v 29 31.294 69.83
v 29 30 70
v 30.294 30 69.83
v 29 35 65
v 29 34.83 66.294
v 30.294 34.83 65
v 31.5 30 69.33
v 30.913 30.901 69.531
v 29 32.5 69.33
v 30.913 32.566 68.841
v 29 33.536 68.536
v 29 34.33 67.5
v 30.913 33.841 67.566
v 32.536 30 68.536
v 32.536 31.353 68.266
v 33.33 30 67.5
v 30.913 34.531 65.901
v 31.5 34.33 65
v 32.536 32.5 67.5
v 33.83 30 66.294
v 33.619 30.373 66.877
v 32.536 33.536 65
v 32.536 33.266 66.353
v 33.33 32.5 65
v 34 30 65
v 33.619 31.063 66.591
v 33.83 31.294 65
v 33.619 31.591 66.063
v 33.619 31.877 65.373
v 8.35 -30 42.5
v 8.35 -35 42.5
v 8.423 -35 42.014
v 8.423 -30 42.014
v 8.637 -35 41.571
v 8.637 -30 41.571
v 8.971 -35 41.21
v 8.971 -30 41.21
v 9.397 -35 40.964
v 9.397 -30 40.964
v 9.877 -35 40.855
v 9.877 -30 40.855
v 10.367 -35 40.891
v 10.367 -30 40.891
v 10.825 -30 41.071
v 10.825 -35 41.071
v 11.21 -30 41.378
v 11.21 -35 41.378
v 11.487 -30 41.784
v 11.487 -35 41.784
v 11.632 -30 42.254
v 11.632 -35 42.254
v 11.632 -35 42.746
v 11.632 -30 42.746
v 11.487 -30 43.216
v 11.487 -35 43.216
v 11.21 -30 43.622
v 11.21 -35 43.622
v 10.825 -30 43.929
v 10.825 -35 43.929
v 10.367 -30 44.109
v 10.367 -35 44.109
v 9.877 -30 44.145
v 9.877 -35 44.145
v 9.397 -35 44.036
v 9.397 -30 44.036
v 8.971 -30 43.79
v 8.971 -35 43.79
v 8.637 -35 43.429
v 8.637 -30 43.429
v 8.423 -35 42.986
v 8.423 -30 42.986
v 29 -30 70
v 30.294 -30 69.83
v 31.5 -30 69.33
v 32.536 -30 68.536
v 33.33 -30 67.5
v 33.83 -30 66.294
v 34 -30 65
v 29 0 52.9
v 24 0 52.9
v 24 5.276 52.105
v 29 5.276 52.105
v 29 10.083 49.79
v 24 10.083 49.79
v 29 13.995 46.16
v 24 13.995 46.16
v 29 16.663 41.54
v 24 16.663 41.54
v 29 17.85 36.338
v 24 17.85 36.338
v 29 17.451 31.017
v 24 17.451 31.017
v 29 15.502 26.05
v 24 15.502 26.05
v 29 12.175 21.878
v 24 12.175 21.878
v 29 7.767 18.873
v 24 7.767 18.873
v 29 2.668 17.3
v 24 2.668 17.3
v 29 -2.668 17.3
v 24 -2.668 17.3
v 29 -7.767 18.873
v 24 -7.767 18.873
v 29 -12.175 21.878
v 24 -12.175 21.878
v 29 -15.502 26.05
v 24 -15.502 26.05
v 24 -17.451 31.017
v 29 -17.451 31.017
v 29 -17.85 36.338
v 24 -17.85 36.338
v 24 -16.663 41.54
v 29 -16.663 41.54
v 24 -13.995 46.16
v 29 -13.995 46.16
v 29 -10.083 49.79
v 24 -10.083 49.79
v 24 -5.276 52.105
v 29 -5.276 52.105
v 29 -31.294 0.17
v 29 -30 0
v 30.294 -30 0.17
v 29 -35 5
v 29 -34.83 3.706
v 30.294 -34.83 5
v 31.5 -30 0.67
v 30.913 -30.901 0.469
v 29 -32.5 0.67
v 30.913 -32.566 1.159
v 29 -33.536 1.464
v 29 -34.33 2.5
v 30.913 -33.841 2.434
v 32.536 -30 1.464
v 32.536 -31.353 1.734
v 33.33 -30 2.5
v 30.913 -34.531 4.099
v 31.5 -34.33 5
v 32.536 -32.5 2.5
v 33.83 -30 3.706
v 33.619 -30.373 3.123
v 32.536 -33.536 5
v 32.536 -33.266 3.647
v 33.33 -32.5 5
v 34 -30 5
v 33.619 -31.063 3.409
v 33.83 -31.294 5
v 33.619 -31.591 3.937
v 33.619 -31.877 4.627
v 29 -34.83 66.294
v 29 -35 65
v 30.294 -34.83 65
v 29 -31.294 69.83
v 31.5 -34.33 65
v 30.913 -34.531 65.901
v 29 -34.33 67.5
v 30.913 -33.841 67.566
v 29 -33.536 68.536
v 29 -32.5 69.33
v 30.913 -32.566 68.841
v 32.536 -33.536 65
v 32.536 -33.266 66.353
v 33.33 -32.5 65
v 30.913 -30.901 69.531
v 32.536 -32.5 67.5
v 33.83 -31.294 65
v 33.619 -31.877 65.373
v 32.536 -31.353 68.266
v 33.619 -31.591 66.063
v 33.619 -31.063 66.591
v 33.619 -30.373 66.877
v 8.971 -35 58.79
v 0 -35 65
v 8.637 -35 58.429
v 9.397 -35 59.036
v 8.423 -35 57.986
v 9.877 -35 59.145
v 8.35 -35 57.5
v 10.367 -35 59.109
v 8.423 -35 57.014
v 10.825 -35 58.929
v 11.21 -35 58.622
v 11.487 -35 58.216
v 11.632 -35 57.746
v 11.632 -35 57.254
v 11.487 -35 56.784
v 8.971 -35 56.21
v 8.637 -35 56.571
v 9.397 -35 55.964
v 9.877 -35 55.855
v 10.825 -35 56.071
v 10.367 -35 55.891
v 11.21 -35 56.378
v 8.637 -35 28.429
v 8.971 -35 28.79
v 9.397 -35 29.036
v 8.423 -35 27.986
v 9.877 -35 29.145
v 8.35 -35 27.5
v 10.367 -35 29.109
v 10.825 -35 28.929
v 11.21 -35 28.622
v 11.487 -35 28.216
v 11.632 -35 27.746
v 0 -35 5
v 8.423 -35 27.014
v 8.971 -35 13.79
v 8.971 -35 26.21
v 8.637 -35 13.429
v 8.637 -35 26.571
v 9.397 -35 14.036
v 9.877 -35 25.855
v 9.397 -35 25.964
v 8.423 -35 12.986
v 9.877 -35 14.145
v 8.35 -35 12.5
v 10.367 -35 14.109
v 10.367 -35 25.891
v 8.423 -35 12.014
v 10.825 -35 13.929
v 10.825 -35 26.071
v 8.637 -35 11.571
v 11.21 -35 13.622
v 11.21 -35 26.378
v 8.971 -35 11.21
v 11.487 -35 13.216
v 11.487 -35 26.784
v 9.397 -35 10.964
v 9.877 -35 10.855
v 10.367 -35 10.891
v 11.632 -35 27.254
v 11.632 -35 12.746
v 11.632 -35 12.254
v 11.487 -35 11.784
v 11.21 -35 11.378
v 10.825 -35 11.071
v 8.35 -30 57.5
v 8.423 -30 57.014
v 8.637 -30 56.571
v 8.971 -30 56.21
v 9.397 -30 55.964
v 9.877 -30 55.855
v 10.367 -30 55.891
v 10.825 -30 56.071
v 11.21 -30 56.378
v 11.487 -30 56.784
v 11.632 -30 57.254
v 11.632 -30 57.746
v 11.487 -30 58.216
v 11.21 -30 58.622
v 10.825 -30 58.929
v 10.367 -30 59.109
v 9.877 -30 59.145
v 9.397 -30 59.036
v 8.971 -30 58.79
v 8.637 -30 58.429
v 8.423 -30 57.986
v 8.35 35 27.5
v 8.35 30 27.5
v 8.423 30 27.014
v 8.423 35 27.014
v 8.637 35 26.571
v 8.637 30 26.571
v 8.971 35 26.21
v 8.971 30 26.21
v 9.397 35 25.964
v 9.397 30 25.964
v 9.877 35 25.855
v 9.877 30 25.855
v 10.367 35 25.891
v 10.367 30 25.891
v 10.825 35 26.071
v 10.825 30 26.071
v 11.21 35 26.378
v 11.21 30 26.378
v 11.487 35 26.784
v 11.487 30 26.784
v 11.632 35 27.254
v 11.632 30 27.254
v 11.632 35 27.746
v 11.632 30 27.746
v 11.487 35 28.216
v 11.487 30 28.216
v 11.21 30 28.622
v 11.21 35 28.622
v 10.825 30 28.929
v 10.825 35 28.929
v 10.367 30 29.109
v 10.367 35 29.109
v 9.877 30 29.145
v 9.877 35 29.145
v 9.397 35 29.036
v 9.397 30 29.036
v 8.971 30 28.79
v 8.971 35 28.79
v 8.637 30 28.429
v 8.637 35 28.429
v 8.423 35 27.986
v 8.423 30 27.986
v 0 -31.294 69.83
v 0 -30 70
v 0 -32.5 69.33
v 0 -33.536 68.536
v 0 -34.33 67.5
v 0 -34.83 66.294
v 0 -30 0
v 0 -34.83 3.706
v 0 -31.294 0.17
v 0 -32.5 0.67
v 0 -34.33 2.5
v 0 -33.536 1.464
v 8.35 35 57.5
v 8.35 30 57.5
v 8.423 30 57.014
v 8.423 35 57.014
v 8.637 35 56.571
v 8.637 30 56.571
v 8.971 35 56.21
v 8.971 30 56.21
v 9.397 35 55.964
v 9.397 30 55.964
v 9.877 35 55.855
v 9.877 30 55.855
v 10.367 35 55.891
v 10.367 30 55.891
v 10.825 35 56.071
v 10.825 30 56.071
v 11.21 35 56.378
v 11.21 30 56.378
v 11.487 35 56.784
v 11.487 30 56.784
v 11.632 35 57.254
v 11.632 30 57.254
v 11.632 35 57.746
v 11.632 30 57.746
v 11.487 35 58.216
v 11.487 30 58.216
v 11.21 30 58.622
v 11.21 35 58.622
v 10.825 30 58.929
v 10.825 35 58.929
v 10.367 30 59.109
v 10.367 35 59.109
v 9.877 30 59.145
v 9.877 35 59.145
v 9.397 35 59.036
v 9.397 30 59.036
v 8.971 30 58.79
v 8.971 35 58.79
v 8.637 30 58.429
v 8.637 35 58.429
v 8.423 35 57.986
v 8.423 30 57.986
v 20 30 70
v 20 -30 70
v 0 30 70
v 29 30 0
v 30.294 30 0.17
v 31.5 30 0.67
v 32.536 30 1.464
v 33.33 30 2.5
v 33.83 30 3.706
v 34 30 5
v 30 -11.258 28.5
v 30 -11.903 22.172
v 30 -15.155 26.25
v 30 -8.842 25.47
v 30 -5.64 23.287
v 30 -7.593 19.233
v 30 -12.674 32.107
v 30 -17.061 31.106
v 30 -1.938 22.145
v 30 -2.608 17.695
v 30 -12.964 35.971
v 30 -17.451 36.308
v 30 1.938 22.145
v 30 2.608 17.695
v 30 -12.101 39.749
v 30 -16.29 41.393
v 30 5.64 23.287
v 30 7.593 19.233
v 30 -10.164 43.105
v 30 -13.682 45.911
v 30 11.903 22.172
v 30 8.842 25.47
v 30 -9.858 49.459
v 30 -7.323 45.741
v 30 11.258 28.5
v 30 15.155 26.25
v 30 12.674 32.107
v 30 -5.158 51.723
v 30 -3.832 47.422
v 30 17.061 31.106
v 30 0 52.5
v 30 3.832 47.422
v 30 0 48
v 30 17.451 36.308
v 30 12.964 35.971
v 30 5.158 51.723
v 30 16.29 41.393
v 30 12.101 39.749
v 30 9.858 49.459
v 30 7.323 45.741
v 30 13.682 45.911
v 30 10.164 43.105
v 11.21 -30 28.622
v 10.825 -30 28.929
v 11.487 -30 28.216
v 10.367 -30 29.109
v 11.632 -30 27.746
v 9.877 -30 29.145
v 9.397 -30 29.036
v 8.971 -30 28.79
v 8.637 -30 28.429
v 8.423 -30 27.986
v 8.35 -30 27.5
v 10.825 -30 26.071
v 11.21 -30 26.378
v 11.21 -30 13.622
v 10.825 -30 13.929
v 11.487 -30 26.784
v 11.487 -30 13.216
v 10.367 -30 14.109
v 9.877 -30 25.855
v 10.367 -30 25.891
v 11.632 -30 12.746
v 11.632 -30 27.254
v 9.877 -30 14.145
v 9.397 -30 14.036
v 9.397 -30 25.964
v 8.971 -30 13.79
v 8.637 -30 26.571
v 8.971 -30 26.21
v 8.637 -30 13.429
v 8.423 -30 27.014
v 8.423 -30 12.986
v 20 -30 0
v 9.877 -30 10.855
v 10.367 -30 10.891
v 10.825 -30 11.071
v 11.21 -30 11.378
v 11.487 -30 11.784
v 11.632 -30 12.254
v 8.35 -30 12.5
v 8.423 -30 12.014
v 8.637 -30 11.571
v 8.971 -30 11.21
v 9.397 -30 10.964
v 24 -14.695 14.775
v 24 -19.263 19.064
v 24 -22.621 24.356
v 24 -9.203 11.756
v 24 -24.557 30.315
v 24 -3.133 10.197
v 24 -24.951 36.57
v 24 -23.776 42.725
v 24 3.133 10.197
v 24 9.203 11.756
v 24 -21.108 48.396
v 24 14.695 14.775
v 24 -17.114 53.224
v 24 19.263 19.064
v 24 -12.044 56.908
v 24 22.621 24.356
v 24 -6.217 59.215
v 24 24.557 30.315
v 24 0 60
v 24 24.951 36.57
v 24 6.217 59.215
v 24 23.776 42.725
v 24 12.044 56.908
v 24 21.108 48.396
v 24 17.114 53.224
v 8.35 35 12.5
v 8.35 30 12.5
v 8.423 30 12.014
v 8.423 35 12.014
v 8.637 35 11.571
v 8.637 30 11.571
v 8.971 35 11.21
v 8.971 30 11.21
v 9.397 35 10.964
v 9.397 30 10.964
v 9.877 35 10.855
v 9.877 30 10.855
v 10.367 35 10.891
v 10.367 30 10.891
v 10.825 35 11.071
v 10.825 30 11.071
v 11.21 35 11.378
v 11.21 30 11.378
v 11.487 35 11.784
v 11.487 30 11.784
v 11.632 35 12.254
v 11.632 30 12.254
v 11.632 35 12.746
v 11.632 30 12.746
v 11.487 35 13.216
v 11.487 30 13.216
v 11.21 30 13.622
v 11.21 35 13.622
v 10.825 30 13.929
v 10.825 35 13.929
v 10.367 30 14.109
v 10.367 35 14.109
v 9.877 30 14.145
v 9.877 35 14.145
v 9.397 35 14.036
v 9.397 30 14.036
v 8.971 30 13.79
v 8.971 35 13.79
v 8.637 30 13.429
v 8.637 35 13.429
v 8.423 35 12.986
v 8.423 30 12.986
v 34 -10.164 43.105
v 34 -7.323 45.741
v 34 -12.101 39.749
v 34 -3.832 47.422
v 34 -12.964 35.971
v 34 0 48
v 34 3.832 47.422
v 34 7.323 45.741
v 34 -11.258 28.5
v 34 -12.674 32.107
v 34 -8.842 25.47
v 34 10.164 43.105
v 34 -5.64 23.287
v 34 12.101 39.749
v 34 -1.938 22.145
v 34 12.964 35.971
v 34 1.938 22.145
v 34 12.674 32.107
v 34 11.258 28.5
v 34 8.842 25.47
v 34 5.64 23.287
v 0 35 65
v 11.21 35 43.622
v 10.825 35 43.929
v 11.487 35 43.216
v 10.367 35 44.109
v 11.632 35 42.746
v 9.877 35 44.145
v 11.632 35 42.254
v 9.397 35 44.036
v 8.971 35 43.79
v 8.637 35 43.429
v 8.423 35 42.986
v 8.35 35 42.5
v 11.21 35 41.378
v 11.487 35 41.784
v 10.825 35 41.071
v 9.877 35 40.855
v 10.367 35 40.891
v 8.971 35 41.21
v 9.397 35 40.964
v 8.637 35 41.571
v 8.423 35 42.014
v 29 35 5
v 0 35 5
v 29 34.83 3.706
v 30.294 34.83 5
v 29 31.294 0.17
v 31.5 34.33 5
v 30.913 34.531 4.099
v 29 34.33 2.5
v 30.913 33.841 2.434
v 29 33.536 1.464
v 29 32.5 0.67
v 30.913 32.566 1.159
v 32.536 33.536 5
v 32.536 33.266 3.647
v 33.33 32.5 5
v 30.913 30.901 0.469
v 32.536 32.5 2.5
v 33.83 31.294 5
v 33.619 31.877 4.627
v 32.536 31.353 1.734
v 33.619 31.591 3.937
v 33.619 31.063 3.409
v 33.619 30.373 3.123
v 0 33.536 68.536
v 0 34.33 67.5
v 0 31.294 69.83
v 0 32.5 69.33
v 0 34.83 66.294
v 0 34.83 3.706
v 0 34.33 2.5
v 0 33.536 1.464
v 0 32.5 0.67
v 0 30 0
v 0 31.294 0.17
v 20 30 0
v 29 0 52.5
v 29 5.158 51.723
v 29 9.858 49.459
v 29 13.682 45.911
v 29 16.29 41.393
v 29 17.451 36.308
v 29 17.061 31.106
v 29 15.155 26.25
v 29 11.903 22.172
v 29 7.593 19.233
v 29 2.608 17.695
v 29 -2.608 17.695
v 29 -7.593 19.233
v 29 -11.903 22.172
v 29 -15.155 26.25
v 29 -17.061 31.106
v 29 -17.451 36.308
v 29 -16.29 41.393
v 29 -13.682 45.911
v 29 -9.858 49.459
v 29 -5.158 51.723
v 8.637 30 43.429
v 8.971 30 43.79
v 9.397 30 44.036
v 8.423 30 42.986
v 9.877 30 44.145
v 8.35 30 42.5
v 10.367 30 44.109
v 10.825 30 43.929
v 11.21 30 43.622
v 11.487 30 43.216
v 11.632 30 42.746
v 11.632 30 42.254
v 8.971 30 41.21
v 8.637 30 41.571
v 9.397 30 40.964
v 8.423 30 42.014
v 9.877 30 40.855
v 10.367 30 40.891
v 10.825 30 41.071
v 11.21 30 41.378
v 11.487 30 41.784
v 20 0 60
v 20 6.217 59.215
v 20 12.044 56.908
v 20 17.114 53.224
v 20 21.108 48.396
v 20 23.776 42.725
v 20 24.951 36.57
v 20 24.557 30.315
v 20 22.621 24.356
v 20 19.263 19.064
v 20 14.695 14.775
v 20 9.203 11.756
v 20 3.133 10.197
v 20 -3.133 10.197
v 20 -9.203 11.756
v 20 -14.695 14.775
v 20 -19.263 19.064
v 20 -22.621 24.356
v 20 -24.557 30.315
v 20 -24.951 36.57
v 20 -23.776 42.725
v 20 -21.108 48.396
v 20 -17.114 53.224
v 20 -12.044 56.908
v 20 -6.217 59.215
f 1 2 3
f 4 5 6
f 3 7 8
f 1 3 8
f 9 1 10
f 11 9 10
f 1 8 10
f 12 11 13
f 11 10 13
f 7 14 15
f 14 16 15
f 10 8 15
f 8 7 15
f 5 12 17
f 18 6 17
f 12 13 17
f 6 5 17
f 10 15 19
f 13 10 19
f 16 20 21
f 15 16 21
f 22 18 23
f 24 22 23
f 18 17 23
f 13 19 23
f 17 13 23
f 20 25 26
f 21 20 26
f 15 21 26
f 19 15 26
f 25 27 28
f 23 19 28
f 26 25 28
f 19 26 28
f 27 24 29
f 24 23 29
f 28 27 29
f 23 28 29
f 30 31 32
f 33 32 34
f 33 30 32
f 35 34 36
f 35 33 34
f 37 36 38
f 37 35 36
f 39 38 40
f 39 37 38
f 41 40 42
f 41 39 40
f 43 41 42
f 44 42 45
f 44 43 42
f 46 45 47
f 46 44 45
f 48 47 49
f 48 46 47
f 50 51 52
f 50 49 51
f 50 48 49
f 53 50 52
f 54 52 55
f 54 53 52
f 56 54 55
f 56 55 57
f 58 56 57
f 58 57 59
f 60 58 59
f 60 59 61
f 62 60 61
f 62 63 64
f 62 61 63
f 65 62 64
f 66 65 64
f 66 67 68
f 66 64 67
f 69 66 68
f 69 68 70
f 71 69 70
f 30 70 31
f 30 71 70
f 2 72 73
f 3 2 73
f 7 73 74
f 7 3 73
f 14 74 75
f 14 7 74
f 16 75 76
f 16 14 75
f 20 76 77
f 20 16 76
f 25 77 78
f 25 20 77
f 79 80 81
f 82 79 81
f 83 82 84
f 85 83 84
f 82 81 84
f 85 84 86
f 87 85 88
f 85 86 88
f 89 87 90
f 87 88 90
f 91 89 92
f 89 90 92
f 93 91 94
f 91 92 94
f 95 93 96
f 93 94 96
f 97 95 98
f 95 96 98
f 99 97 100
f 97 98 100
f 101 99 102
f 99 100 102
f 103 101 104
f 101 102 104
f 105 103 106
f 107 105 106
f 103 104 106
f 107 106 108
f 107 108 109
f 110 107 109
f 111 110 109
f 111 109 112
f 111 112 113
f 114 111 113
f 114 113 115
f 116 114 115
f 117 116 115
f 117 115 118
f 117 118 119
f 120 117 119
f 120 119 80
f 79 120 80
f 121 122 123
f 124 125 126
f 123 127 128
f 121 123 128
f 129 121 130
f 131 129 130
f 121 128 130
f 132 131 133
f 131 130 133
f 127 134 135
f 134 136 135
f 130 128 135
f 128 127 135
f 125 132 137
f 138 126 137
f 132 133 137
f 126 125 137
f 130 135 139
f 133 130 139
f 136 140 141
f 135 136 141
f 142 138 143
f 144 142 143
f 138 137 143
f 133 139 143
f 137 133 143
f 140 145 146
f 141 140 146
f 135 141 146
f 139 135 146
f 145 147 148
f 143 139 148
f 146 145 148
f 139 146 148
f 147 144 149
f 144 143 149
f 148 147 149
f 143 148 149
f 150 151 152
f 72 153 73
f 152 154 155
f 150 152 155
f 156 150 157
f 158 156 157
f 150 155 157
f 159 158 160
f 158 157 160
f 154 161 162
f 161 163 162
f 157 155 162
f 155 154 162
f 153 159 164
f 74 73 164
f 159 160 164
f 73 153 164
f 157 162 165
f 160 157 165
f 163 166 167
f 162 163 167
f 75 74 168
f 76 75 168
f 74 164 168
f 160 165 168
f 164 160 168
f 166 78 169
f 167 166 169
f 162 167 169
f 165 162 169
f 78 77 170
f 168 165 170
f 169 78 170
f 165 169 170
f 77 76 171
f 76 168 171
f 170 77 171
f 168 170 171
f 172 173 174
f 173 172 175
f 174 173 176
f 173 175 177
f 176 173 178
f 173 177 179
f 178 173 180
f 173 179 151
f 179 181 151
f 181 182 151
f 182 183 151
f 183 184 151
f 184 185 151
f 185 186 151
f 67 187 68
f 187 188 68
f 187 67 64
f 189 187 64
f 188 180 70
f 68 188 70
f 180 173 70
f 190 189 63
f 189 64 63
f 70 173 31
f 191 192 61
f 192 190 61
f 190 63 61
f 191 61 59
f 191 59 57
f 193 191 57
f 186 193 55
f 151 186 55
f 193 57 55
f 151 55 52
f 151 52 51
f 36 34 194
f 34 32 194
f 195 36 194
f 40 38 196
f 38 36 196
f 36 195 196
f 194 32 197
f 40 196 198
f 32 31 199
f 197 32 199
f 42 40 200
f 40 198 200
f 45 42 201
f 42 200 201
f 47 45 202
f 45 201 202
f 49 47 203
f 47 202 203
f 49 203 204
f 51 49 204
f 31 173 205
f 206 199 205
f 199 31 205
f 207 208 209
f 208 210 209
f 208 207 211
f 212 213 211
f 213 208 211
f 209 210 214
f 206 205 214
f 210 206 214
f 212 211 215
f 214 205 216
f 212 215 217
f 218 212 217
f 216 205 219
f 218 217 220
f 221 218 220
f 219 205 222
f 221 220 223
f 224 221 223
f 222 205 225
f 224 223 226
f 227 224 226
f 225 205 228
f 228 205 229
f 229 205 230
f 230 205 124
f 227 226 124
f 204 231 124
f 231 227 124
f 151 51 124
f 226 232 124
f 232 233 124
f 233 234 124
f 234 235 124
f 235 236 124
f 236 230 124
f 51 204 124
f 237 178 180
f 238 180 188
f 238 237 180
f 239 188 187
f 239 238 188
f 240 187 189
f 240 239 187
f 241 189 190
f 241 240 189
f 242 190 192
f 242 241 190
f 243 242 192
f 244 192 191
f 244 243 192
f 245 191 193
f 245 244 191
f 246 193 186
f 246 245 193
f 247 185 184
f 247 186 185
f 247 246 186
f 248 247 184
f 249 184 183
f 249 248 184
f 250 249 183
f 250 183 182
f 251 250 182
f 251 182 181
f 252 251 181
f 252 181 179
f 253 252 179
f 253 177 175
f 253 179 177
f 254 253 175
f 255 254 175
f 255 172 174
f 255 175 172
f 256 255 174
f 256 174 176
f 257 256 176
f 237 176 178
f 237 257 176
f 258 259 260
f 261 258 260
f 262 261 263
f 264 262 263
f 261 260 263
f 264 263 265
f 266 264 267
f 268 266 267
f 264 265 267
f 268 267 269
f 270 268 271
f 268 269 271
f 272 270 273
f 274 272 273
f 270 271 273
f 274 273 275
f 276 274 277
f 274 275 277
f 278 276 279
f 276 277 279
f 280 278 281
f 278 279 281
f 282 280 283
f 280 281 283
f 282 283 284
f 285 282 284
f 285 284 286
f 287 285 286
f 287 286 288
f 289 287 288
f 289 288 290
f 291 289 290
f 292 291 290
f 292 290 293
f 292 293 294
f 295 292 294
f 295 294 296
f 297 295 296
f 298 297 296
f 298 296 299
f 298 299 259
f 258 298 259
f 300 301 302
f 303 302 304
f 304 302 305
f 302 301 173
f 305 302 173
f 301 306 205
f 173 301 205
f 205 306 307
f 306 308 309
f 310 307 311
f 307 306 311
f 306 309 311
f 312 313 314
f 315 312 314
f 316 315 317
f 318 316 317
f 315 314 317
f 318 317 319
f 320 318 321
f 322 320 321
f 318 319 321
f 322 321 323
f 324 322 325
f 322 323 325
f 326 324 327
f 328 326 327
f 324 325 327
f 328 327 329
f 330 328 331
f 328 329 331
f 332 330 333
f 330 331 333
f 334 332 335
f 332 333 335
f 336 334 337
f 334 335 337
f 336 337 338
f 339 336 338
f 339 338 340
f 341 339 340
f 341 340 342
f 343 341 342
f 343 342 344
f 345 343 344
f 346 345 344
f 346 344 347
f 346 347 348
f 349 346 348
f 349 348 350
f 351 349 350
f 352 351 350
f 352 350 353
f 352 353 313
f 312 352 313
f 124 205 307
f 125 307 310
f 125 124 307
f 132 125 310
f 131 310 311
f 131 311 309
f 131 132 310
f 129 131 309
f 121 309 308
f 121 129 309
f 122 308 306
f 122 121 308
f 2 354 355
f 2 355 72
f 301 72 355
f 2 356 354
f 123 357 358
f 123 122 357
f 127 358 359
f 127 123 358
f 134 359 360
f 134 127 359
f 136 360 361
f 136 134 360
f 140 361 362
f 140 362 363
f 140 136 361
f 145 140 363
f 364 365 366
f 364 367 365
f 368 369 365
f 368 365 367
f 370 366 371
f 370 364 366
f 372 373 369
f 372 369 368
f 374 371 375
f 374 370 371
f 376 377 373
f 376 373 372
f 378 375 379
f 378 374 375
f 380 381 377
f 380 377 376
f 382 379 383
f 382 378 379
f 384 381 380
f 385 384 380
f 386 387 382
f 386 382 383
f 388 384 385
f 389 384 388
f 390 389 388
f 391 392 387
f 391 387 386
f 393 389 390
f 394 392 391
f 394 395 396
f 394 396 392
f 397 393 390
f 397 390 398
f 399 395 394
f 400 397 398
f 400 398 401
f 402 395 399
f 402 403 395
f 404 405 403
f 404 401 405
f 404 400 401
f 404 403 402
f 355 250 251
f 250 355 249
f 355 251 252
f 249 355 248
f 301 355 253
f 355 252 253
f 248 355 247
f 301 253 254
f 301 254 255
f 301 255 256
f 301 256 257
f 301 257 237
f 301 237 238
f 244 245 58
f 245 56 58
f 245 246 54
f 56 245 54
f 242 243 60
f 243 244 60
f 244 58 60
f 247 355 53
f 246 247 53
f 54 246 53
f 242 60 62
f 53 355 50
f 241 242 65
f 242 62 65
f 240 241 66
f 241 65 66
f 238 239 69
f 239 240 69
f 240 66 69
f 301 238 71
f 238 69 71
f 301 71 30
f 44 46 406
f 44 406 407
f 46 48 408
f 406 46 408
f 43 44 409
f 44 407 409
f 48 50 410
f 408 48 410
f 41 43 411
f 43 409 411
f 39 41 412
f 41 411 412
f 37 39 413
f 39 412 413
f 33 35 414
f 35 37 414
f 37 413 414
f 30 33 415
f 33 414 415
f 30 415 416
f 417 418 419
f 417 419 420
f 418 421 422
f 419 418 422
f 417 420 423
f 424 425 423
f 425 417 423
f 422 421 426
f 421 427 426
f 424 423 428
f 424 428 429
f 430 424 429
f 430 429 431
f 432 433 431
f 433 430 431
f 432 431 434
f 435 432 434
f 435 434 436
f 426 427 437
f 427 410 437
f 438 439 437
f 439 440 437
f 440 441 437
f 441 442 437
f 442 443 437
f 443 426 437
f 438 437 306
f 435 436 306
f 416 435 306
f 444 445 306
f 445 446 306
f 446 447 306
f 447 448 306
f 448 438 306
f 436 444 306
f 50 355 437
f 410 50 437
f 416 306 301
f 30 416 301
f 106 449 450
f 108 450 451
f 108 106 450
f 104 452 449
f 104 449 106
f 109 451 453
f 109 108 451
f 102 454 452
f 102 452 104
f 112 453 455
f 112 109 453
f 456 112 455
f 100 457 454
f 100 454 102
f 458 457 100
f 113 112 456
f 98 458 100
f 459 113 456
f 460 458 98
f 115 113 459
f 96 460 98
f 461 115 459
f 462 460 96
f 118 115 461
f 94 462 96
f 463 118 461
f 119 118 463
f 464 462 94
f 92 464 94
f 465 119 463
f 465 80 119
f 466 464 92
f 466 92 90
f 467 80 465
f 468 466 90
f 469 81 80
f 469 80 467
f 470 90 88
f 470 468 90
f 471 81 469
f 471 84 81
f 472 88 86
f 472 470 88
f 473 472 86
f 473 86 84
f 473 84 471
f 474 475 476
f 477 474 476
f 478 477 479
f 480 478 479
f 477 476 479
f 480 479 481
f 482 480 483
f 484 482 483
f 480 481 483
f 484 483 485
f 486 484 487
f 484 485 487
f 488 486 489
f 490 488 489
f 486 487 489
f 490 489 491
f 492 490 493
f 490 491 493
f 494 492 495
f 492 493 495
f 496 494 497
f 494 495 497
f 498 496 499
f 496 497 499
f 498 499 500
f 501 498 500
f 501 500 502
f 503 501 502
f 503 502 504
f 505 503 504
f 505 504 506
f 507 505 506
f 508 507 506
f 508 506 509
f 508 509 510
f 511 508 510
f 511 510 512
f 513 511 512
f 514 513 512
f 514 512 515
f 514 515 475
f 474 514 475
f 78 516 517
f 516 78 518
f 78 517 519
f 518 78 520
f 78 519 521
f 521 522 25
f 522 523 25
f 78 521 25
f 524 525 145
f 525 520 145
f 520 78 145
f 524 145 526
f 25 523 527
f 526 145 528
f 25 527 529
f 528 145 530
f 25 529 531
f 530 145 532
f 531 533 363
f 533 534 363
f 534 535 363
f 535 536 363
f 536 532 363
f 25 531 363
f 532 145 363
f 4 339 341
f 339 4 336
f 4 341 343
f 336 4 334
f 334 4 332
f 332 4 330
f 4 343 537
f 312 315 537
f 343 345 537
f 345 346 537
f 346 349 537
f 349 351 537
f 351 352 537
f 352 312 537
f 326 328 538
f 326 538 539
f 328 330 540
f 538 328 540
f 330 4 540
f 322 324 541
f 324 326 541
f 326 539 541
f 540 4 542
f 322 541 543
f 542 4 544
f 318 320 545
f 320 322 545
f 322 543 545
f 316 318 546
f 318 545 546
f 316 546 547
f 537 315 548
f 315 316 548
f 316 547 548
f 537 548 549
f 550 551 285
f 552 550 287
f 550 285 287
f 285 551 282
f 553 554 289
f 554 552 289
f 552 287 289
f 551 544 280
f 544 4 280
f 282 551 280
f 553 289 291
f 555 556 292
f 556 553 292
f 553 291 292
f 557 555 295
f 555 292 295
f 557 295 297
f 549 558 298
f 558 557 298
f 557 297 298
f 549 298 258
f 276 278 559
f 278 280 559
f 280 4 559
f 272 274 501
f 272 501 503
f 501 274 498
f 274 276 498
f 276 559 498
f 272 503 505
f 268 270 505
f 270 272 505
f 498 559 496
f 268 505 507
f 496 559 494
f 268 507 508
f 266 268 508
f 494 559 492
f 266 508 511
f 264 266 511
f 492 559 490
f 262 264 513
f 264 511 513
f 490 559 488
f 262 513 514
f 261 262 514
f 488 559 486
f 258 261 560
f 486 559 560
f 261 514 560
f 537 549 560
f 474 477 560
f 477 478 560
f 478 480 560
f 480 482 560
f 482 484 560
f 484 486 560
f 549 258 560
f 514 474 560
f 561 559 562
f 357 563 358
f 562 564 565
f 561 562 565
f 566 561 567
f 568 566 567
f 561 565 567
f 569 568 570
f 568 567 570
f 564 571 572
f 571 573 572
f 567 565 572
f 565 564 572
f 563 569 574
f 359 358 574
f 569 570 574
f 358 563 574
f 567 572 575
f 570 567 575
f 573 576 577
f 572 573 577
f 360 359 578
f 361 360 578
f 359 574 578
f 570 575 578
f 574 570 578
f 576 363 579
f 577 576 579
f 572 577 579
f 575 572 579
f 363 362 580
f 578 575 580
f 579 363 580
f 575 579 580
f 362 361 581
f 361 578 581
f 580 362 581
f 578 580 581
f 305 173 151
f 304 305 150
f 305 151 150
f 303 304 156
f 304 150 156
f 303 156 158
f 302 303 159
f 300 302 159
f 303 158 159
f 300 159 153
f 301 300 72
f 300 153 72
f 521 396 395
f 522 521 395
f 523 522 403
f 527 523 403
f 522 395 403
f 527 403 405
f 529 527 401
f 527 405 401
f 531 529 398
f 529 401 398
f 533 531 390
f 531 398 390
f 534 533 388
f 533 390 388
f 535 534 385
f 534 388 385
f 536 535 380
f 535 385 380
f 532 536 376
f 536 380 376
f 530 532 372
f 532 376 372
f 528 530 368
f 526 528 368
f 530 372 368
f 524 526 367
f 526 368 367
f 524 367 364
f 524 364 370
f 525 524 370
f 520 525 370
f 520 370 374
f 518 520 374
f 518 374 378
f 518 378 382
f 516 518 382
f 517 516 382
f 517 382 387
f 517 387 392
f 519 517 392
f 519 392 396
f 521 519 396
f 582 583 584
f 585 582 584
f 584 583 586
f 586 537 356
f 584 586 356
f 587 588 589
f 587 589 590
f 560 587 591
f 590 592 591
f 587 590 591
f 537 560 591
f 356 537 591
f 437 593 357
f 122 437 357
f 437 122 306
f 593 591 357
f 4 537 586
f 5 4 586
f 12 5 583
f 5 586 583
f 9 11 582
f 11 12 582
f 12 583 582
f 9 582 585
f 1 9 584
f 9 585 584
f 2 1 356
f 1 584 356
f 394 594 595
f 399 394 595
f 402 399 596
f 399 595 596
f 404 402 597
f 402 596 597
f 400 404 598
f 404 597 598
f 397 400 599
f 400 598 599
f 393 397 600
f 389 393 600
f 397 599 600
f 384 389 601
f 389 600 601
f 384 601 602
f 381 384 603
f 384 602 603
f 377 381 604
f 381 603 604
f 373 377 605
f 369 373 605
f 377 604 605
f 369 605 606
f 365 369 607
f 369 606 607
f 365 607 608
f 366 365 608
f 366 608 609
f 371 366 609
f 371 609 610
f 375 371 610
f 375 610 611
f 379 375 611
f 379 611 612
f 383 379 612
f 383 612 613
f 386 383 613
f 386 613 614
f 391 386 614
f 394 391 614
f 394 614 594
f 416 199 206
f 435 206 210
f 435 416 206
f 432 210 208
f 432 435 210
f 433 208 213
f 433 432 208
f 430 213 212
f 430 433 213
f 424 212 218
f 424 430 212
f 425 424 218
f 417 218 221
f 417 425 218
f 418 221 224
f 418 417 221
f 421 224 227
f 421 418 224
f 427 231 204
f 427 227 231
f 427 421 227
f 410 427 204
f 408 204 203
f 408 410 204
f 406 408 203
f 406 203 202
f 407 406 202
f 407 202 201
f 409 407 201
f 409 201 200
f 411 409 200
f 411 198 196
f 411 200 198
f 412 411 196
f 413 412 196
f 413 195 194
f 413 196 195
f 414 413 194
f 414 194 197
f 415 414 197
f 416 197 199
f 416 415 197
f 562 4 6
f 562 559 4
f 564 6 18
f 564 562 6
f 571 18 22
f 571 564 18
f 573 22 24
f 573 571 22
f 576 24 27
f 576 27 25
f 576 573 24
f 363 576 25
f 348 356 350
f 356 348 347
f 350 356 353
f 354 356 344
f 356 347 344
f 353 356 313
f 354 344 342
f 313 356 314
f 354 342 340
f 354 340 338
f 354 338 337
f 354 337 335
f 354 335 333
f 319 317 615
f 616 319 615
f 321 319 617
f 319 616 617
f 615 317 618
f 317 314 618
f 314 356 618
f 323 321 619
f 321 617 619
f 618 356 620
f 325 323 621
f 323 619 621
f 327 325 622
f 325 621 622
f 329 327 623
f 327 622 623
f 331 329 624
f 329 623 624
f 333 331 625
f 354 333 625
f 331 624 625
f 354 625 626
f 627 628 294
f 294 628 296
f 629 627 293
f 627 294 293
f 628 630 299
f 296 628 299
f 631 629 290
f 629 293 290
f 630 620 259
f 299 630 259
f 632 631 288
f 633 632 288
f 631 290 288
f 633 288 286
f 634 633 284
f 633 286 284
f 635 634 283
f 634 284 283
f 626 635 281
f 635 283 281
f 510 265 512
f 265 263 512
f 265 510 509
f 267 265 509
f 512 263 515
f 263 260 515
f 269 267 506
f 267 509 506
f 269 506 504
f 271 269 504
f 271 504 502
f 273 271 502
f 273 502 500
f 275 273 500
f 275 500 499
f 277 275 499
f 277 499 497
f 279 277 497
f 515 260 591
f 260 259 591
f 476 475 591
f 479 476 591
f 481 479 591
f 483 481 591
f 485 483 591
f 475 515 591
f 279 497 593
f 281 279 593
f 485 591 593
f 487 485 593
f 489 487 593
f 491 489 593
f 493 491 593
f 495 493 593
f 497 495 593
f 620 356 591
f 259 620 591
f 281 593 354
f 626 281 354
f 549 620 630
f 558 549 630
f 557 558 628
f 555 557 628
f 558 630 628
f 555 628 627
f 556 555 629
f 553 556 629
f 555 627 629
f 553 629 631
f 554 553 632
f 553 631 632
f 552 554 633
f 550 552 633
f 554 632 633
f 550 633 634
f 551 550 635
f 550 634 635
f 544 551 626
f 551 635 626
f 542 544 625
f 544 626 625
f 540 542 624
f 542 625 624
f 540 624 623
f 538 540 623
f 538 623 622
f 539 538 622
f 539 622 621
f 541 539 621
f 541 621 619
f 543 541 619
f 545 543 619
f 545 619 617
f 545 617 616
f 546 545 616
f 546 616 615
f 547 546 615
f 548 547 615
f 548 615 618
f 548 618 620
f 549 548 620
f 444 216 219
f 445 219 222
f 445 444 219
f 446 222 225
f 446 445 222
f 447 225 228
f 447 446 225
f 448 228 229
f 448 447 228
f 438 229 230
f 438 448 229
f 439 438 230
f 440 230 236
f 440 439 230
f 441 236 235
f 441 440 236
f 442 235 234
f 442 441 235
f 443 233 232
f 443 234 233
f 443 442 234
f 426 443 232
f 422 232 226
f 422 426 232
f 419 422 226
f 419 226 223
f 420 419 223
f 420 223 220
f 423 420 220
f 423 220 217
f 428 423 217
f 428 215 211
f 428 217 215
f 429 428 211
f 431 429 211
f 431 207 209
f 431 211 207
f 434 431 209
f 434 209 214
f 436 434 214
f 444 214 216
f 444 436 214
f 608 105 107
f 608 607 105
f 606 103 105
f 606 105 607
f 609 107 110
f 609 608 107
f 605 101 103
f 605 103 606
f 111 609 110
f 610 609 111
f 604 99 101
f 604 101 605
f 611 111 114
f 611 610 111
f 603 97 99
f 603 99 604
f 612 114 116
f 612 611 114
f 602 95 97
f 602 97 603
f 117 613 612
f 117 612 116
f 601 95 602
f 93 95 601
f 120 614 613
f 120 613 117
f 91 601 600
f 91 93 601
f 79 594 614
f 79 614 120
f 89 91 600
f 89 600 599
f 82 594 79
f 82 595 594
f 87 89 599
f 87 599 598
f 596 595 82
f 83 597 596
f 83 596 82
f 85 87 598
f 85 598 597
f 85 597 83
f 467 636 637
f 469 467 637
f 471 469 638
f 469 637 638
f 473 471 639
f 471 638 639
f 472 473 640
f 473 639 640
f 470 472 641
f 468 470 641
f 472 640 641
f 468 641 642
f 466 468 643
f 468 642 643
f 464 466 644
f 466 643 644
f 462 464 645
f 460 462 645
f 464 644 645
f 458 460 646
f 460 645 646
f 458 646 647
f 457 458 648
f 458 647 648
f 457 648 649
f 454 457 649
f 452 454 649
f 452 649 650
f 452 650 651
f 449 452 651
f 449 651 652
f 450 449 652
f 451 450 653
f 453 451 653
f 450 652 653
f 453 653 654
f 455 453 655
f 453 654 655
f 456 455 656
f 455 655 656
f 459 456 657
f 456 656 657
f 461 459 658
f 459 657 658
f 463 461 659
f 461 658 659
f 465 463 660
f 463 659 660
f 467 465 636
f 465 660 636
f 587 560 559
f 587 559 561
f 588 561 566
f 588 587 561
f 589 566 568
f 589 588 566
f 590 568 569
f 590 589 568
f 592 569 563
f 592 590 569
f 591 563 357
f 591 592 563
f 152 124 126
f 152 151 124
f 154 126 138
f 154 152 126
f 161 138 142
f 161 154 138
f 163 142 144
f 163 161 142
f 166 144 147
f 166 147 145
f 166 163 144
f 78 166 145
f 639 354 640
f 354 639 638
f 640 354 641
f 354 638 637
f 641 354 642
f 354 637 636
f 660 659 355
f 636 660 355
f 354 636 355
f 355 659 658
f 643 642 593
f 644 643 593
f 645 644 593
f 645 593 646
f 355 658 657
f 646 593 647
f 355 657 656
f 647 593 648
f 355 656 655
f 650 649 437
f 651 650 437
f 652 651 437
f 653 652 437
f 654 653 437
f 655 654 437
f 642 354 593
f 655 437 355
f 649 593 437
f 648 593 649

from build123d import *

# Parameters (mm, degrees)
BOSS_EXTRUDE1_DEPTH       = 70
FILLET1_R                 = 5
FILLET2_R                 = 5
M4X0_7_TAPPED_HOLE1_D     = 3.3
M4X0_7_TAPPED_HOLE1_DEPTH = 5
SKETCH13_R                = 25
CUT_EXTRUDE1_DEPTH        = 4
SKETCH14_R                = 17.9
CUT_EXTRUDE2_DEPTH        = 2
SKETCH15_R                = 17.5
CUT_EXTRUDE3_DEPTH        = 4
SKETCH16_R                = 13
CUT_EXTRUDE4_DEPTH        = 84.815273071
SKETCH17_R                = 17.9
CUT_EXTRUDE5_DEPTH        = 3


with BuildPart() as part:
    # Sketch1 → Boss-Extrude1 (new body)
    with BuildSketch(Plane.XY):
        Polygon((0, -30), (0, -35), (34, -35), (34, 35), (0, 35), (0, 30), (20, 30), (20, -30), align=None)
    extrude(amount=BOSS_EXTRUDE1_DEPTH)

    # Fillet1
    fillet1_edges = [part.edges().sort_by_distance(p)[0] for p in [
        (17, -35, 70),
        (17, -35, 0),
        (17, 35, 0),
        (17, 35, 70),
    ]]
    fillet(fillet1_edges, radius=FILLET1_R - 0.0001)  # a hair under: the kernel refuses the full size

    # Fillet2
    fillet2_edges = [part.edges().sort_by_distance(p)[0] for p in [
        (34, 0, 70),
        (34, 0, 0),
        (34, 35, 35),
        (34, -35, 35),
        (34, 33.535563195, 68.535563195),
        (34, 33.535563195, 1.464436805),
        (34, -33.535563195, 1.464436805),
        (34, -33.535563195, 68.535563195),
    ]]
    fillet(fillet2_edges, radius=FILLET2_R - 0.0001)  # a hair under: the kernel refuses the full size

    # M4x0.7 Tapped Hole1
    with Locations(Plane(origin=(0, 35, 0), x_dir=(1, 0, 0), z_dir=(0, 1, 0))):
        with Locations((10, -12.5), (10, -27.5), (10, -42.5), (10, -57.5)):
            m4x0_7_tapped_hole1 = Hole(M4X0_7_TAPPED_HOLE1_D / 2, depth=M4X0_7_TAPPED_HOLE1_DEPTH)

    # Mirror1: M4x0.7 Tapped Hole1 across plane
    add(m4x0_7_tapped_hole1.mirror(Plane.ZX), mode=Mode.SUBTRACT)

    # Sketch13 → Cut-Extrude1 (cut)
    with BuildSketch(Plane.ZY.offset(-20)):
        with Locations((35, 0)):
            Circle(SKETCH13_R)
    extrude(amount=-CUT_EXTRUDE1_DEPTH, mode=Mode.SUBTRACT)

    # Sketch14 → Cut-Extrude2 (cut)
    with BuildSketch(Plane.ZY.offset(-24)):
        with Locations((35, 0)):
            Circle(SKETCH14_R)
    extrude(amount=-CUT_EXTRUDE2_DEPTH, mode=Mode.SUBTRACT)

    # Sketch15 → Cut-Extrude3 (cut)
    with BuildSketch(Plane.ZY.offset(-26)):
        with Locations((35, 0)):
            Circle(SKETCH15_R)
    extrude(amount=-CUT_EXTRUDE3_DEPTH, mode=Mode.SUBTRACT)

    # Sketch16 → Cut-Extrude4 (cut, through all)
    with BuildSketch(Plane.ZY.offset(-30)):
        with Locations((35, 0)):
            Circle(SKETCH16_R)
    extrude(amount=-CUT_EXTRUDE4_DEPTH, mode=Mode.SUBTRACT)

    # Sketch17 → Cut-Extrude5 (cut)
    with BuildSketch(Plane.ZY.offset(-26)):
        with Locations((35, 0)):
            Circle(SKETCH17_R)
    extrude(amount=-CUT_EXTRUDE5_DEPTH, mode=Mode.SUBTRACT)


solid = part.part
